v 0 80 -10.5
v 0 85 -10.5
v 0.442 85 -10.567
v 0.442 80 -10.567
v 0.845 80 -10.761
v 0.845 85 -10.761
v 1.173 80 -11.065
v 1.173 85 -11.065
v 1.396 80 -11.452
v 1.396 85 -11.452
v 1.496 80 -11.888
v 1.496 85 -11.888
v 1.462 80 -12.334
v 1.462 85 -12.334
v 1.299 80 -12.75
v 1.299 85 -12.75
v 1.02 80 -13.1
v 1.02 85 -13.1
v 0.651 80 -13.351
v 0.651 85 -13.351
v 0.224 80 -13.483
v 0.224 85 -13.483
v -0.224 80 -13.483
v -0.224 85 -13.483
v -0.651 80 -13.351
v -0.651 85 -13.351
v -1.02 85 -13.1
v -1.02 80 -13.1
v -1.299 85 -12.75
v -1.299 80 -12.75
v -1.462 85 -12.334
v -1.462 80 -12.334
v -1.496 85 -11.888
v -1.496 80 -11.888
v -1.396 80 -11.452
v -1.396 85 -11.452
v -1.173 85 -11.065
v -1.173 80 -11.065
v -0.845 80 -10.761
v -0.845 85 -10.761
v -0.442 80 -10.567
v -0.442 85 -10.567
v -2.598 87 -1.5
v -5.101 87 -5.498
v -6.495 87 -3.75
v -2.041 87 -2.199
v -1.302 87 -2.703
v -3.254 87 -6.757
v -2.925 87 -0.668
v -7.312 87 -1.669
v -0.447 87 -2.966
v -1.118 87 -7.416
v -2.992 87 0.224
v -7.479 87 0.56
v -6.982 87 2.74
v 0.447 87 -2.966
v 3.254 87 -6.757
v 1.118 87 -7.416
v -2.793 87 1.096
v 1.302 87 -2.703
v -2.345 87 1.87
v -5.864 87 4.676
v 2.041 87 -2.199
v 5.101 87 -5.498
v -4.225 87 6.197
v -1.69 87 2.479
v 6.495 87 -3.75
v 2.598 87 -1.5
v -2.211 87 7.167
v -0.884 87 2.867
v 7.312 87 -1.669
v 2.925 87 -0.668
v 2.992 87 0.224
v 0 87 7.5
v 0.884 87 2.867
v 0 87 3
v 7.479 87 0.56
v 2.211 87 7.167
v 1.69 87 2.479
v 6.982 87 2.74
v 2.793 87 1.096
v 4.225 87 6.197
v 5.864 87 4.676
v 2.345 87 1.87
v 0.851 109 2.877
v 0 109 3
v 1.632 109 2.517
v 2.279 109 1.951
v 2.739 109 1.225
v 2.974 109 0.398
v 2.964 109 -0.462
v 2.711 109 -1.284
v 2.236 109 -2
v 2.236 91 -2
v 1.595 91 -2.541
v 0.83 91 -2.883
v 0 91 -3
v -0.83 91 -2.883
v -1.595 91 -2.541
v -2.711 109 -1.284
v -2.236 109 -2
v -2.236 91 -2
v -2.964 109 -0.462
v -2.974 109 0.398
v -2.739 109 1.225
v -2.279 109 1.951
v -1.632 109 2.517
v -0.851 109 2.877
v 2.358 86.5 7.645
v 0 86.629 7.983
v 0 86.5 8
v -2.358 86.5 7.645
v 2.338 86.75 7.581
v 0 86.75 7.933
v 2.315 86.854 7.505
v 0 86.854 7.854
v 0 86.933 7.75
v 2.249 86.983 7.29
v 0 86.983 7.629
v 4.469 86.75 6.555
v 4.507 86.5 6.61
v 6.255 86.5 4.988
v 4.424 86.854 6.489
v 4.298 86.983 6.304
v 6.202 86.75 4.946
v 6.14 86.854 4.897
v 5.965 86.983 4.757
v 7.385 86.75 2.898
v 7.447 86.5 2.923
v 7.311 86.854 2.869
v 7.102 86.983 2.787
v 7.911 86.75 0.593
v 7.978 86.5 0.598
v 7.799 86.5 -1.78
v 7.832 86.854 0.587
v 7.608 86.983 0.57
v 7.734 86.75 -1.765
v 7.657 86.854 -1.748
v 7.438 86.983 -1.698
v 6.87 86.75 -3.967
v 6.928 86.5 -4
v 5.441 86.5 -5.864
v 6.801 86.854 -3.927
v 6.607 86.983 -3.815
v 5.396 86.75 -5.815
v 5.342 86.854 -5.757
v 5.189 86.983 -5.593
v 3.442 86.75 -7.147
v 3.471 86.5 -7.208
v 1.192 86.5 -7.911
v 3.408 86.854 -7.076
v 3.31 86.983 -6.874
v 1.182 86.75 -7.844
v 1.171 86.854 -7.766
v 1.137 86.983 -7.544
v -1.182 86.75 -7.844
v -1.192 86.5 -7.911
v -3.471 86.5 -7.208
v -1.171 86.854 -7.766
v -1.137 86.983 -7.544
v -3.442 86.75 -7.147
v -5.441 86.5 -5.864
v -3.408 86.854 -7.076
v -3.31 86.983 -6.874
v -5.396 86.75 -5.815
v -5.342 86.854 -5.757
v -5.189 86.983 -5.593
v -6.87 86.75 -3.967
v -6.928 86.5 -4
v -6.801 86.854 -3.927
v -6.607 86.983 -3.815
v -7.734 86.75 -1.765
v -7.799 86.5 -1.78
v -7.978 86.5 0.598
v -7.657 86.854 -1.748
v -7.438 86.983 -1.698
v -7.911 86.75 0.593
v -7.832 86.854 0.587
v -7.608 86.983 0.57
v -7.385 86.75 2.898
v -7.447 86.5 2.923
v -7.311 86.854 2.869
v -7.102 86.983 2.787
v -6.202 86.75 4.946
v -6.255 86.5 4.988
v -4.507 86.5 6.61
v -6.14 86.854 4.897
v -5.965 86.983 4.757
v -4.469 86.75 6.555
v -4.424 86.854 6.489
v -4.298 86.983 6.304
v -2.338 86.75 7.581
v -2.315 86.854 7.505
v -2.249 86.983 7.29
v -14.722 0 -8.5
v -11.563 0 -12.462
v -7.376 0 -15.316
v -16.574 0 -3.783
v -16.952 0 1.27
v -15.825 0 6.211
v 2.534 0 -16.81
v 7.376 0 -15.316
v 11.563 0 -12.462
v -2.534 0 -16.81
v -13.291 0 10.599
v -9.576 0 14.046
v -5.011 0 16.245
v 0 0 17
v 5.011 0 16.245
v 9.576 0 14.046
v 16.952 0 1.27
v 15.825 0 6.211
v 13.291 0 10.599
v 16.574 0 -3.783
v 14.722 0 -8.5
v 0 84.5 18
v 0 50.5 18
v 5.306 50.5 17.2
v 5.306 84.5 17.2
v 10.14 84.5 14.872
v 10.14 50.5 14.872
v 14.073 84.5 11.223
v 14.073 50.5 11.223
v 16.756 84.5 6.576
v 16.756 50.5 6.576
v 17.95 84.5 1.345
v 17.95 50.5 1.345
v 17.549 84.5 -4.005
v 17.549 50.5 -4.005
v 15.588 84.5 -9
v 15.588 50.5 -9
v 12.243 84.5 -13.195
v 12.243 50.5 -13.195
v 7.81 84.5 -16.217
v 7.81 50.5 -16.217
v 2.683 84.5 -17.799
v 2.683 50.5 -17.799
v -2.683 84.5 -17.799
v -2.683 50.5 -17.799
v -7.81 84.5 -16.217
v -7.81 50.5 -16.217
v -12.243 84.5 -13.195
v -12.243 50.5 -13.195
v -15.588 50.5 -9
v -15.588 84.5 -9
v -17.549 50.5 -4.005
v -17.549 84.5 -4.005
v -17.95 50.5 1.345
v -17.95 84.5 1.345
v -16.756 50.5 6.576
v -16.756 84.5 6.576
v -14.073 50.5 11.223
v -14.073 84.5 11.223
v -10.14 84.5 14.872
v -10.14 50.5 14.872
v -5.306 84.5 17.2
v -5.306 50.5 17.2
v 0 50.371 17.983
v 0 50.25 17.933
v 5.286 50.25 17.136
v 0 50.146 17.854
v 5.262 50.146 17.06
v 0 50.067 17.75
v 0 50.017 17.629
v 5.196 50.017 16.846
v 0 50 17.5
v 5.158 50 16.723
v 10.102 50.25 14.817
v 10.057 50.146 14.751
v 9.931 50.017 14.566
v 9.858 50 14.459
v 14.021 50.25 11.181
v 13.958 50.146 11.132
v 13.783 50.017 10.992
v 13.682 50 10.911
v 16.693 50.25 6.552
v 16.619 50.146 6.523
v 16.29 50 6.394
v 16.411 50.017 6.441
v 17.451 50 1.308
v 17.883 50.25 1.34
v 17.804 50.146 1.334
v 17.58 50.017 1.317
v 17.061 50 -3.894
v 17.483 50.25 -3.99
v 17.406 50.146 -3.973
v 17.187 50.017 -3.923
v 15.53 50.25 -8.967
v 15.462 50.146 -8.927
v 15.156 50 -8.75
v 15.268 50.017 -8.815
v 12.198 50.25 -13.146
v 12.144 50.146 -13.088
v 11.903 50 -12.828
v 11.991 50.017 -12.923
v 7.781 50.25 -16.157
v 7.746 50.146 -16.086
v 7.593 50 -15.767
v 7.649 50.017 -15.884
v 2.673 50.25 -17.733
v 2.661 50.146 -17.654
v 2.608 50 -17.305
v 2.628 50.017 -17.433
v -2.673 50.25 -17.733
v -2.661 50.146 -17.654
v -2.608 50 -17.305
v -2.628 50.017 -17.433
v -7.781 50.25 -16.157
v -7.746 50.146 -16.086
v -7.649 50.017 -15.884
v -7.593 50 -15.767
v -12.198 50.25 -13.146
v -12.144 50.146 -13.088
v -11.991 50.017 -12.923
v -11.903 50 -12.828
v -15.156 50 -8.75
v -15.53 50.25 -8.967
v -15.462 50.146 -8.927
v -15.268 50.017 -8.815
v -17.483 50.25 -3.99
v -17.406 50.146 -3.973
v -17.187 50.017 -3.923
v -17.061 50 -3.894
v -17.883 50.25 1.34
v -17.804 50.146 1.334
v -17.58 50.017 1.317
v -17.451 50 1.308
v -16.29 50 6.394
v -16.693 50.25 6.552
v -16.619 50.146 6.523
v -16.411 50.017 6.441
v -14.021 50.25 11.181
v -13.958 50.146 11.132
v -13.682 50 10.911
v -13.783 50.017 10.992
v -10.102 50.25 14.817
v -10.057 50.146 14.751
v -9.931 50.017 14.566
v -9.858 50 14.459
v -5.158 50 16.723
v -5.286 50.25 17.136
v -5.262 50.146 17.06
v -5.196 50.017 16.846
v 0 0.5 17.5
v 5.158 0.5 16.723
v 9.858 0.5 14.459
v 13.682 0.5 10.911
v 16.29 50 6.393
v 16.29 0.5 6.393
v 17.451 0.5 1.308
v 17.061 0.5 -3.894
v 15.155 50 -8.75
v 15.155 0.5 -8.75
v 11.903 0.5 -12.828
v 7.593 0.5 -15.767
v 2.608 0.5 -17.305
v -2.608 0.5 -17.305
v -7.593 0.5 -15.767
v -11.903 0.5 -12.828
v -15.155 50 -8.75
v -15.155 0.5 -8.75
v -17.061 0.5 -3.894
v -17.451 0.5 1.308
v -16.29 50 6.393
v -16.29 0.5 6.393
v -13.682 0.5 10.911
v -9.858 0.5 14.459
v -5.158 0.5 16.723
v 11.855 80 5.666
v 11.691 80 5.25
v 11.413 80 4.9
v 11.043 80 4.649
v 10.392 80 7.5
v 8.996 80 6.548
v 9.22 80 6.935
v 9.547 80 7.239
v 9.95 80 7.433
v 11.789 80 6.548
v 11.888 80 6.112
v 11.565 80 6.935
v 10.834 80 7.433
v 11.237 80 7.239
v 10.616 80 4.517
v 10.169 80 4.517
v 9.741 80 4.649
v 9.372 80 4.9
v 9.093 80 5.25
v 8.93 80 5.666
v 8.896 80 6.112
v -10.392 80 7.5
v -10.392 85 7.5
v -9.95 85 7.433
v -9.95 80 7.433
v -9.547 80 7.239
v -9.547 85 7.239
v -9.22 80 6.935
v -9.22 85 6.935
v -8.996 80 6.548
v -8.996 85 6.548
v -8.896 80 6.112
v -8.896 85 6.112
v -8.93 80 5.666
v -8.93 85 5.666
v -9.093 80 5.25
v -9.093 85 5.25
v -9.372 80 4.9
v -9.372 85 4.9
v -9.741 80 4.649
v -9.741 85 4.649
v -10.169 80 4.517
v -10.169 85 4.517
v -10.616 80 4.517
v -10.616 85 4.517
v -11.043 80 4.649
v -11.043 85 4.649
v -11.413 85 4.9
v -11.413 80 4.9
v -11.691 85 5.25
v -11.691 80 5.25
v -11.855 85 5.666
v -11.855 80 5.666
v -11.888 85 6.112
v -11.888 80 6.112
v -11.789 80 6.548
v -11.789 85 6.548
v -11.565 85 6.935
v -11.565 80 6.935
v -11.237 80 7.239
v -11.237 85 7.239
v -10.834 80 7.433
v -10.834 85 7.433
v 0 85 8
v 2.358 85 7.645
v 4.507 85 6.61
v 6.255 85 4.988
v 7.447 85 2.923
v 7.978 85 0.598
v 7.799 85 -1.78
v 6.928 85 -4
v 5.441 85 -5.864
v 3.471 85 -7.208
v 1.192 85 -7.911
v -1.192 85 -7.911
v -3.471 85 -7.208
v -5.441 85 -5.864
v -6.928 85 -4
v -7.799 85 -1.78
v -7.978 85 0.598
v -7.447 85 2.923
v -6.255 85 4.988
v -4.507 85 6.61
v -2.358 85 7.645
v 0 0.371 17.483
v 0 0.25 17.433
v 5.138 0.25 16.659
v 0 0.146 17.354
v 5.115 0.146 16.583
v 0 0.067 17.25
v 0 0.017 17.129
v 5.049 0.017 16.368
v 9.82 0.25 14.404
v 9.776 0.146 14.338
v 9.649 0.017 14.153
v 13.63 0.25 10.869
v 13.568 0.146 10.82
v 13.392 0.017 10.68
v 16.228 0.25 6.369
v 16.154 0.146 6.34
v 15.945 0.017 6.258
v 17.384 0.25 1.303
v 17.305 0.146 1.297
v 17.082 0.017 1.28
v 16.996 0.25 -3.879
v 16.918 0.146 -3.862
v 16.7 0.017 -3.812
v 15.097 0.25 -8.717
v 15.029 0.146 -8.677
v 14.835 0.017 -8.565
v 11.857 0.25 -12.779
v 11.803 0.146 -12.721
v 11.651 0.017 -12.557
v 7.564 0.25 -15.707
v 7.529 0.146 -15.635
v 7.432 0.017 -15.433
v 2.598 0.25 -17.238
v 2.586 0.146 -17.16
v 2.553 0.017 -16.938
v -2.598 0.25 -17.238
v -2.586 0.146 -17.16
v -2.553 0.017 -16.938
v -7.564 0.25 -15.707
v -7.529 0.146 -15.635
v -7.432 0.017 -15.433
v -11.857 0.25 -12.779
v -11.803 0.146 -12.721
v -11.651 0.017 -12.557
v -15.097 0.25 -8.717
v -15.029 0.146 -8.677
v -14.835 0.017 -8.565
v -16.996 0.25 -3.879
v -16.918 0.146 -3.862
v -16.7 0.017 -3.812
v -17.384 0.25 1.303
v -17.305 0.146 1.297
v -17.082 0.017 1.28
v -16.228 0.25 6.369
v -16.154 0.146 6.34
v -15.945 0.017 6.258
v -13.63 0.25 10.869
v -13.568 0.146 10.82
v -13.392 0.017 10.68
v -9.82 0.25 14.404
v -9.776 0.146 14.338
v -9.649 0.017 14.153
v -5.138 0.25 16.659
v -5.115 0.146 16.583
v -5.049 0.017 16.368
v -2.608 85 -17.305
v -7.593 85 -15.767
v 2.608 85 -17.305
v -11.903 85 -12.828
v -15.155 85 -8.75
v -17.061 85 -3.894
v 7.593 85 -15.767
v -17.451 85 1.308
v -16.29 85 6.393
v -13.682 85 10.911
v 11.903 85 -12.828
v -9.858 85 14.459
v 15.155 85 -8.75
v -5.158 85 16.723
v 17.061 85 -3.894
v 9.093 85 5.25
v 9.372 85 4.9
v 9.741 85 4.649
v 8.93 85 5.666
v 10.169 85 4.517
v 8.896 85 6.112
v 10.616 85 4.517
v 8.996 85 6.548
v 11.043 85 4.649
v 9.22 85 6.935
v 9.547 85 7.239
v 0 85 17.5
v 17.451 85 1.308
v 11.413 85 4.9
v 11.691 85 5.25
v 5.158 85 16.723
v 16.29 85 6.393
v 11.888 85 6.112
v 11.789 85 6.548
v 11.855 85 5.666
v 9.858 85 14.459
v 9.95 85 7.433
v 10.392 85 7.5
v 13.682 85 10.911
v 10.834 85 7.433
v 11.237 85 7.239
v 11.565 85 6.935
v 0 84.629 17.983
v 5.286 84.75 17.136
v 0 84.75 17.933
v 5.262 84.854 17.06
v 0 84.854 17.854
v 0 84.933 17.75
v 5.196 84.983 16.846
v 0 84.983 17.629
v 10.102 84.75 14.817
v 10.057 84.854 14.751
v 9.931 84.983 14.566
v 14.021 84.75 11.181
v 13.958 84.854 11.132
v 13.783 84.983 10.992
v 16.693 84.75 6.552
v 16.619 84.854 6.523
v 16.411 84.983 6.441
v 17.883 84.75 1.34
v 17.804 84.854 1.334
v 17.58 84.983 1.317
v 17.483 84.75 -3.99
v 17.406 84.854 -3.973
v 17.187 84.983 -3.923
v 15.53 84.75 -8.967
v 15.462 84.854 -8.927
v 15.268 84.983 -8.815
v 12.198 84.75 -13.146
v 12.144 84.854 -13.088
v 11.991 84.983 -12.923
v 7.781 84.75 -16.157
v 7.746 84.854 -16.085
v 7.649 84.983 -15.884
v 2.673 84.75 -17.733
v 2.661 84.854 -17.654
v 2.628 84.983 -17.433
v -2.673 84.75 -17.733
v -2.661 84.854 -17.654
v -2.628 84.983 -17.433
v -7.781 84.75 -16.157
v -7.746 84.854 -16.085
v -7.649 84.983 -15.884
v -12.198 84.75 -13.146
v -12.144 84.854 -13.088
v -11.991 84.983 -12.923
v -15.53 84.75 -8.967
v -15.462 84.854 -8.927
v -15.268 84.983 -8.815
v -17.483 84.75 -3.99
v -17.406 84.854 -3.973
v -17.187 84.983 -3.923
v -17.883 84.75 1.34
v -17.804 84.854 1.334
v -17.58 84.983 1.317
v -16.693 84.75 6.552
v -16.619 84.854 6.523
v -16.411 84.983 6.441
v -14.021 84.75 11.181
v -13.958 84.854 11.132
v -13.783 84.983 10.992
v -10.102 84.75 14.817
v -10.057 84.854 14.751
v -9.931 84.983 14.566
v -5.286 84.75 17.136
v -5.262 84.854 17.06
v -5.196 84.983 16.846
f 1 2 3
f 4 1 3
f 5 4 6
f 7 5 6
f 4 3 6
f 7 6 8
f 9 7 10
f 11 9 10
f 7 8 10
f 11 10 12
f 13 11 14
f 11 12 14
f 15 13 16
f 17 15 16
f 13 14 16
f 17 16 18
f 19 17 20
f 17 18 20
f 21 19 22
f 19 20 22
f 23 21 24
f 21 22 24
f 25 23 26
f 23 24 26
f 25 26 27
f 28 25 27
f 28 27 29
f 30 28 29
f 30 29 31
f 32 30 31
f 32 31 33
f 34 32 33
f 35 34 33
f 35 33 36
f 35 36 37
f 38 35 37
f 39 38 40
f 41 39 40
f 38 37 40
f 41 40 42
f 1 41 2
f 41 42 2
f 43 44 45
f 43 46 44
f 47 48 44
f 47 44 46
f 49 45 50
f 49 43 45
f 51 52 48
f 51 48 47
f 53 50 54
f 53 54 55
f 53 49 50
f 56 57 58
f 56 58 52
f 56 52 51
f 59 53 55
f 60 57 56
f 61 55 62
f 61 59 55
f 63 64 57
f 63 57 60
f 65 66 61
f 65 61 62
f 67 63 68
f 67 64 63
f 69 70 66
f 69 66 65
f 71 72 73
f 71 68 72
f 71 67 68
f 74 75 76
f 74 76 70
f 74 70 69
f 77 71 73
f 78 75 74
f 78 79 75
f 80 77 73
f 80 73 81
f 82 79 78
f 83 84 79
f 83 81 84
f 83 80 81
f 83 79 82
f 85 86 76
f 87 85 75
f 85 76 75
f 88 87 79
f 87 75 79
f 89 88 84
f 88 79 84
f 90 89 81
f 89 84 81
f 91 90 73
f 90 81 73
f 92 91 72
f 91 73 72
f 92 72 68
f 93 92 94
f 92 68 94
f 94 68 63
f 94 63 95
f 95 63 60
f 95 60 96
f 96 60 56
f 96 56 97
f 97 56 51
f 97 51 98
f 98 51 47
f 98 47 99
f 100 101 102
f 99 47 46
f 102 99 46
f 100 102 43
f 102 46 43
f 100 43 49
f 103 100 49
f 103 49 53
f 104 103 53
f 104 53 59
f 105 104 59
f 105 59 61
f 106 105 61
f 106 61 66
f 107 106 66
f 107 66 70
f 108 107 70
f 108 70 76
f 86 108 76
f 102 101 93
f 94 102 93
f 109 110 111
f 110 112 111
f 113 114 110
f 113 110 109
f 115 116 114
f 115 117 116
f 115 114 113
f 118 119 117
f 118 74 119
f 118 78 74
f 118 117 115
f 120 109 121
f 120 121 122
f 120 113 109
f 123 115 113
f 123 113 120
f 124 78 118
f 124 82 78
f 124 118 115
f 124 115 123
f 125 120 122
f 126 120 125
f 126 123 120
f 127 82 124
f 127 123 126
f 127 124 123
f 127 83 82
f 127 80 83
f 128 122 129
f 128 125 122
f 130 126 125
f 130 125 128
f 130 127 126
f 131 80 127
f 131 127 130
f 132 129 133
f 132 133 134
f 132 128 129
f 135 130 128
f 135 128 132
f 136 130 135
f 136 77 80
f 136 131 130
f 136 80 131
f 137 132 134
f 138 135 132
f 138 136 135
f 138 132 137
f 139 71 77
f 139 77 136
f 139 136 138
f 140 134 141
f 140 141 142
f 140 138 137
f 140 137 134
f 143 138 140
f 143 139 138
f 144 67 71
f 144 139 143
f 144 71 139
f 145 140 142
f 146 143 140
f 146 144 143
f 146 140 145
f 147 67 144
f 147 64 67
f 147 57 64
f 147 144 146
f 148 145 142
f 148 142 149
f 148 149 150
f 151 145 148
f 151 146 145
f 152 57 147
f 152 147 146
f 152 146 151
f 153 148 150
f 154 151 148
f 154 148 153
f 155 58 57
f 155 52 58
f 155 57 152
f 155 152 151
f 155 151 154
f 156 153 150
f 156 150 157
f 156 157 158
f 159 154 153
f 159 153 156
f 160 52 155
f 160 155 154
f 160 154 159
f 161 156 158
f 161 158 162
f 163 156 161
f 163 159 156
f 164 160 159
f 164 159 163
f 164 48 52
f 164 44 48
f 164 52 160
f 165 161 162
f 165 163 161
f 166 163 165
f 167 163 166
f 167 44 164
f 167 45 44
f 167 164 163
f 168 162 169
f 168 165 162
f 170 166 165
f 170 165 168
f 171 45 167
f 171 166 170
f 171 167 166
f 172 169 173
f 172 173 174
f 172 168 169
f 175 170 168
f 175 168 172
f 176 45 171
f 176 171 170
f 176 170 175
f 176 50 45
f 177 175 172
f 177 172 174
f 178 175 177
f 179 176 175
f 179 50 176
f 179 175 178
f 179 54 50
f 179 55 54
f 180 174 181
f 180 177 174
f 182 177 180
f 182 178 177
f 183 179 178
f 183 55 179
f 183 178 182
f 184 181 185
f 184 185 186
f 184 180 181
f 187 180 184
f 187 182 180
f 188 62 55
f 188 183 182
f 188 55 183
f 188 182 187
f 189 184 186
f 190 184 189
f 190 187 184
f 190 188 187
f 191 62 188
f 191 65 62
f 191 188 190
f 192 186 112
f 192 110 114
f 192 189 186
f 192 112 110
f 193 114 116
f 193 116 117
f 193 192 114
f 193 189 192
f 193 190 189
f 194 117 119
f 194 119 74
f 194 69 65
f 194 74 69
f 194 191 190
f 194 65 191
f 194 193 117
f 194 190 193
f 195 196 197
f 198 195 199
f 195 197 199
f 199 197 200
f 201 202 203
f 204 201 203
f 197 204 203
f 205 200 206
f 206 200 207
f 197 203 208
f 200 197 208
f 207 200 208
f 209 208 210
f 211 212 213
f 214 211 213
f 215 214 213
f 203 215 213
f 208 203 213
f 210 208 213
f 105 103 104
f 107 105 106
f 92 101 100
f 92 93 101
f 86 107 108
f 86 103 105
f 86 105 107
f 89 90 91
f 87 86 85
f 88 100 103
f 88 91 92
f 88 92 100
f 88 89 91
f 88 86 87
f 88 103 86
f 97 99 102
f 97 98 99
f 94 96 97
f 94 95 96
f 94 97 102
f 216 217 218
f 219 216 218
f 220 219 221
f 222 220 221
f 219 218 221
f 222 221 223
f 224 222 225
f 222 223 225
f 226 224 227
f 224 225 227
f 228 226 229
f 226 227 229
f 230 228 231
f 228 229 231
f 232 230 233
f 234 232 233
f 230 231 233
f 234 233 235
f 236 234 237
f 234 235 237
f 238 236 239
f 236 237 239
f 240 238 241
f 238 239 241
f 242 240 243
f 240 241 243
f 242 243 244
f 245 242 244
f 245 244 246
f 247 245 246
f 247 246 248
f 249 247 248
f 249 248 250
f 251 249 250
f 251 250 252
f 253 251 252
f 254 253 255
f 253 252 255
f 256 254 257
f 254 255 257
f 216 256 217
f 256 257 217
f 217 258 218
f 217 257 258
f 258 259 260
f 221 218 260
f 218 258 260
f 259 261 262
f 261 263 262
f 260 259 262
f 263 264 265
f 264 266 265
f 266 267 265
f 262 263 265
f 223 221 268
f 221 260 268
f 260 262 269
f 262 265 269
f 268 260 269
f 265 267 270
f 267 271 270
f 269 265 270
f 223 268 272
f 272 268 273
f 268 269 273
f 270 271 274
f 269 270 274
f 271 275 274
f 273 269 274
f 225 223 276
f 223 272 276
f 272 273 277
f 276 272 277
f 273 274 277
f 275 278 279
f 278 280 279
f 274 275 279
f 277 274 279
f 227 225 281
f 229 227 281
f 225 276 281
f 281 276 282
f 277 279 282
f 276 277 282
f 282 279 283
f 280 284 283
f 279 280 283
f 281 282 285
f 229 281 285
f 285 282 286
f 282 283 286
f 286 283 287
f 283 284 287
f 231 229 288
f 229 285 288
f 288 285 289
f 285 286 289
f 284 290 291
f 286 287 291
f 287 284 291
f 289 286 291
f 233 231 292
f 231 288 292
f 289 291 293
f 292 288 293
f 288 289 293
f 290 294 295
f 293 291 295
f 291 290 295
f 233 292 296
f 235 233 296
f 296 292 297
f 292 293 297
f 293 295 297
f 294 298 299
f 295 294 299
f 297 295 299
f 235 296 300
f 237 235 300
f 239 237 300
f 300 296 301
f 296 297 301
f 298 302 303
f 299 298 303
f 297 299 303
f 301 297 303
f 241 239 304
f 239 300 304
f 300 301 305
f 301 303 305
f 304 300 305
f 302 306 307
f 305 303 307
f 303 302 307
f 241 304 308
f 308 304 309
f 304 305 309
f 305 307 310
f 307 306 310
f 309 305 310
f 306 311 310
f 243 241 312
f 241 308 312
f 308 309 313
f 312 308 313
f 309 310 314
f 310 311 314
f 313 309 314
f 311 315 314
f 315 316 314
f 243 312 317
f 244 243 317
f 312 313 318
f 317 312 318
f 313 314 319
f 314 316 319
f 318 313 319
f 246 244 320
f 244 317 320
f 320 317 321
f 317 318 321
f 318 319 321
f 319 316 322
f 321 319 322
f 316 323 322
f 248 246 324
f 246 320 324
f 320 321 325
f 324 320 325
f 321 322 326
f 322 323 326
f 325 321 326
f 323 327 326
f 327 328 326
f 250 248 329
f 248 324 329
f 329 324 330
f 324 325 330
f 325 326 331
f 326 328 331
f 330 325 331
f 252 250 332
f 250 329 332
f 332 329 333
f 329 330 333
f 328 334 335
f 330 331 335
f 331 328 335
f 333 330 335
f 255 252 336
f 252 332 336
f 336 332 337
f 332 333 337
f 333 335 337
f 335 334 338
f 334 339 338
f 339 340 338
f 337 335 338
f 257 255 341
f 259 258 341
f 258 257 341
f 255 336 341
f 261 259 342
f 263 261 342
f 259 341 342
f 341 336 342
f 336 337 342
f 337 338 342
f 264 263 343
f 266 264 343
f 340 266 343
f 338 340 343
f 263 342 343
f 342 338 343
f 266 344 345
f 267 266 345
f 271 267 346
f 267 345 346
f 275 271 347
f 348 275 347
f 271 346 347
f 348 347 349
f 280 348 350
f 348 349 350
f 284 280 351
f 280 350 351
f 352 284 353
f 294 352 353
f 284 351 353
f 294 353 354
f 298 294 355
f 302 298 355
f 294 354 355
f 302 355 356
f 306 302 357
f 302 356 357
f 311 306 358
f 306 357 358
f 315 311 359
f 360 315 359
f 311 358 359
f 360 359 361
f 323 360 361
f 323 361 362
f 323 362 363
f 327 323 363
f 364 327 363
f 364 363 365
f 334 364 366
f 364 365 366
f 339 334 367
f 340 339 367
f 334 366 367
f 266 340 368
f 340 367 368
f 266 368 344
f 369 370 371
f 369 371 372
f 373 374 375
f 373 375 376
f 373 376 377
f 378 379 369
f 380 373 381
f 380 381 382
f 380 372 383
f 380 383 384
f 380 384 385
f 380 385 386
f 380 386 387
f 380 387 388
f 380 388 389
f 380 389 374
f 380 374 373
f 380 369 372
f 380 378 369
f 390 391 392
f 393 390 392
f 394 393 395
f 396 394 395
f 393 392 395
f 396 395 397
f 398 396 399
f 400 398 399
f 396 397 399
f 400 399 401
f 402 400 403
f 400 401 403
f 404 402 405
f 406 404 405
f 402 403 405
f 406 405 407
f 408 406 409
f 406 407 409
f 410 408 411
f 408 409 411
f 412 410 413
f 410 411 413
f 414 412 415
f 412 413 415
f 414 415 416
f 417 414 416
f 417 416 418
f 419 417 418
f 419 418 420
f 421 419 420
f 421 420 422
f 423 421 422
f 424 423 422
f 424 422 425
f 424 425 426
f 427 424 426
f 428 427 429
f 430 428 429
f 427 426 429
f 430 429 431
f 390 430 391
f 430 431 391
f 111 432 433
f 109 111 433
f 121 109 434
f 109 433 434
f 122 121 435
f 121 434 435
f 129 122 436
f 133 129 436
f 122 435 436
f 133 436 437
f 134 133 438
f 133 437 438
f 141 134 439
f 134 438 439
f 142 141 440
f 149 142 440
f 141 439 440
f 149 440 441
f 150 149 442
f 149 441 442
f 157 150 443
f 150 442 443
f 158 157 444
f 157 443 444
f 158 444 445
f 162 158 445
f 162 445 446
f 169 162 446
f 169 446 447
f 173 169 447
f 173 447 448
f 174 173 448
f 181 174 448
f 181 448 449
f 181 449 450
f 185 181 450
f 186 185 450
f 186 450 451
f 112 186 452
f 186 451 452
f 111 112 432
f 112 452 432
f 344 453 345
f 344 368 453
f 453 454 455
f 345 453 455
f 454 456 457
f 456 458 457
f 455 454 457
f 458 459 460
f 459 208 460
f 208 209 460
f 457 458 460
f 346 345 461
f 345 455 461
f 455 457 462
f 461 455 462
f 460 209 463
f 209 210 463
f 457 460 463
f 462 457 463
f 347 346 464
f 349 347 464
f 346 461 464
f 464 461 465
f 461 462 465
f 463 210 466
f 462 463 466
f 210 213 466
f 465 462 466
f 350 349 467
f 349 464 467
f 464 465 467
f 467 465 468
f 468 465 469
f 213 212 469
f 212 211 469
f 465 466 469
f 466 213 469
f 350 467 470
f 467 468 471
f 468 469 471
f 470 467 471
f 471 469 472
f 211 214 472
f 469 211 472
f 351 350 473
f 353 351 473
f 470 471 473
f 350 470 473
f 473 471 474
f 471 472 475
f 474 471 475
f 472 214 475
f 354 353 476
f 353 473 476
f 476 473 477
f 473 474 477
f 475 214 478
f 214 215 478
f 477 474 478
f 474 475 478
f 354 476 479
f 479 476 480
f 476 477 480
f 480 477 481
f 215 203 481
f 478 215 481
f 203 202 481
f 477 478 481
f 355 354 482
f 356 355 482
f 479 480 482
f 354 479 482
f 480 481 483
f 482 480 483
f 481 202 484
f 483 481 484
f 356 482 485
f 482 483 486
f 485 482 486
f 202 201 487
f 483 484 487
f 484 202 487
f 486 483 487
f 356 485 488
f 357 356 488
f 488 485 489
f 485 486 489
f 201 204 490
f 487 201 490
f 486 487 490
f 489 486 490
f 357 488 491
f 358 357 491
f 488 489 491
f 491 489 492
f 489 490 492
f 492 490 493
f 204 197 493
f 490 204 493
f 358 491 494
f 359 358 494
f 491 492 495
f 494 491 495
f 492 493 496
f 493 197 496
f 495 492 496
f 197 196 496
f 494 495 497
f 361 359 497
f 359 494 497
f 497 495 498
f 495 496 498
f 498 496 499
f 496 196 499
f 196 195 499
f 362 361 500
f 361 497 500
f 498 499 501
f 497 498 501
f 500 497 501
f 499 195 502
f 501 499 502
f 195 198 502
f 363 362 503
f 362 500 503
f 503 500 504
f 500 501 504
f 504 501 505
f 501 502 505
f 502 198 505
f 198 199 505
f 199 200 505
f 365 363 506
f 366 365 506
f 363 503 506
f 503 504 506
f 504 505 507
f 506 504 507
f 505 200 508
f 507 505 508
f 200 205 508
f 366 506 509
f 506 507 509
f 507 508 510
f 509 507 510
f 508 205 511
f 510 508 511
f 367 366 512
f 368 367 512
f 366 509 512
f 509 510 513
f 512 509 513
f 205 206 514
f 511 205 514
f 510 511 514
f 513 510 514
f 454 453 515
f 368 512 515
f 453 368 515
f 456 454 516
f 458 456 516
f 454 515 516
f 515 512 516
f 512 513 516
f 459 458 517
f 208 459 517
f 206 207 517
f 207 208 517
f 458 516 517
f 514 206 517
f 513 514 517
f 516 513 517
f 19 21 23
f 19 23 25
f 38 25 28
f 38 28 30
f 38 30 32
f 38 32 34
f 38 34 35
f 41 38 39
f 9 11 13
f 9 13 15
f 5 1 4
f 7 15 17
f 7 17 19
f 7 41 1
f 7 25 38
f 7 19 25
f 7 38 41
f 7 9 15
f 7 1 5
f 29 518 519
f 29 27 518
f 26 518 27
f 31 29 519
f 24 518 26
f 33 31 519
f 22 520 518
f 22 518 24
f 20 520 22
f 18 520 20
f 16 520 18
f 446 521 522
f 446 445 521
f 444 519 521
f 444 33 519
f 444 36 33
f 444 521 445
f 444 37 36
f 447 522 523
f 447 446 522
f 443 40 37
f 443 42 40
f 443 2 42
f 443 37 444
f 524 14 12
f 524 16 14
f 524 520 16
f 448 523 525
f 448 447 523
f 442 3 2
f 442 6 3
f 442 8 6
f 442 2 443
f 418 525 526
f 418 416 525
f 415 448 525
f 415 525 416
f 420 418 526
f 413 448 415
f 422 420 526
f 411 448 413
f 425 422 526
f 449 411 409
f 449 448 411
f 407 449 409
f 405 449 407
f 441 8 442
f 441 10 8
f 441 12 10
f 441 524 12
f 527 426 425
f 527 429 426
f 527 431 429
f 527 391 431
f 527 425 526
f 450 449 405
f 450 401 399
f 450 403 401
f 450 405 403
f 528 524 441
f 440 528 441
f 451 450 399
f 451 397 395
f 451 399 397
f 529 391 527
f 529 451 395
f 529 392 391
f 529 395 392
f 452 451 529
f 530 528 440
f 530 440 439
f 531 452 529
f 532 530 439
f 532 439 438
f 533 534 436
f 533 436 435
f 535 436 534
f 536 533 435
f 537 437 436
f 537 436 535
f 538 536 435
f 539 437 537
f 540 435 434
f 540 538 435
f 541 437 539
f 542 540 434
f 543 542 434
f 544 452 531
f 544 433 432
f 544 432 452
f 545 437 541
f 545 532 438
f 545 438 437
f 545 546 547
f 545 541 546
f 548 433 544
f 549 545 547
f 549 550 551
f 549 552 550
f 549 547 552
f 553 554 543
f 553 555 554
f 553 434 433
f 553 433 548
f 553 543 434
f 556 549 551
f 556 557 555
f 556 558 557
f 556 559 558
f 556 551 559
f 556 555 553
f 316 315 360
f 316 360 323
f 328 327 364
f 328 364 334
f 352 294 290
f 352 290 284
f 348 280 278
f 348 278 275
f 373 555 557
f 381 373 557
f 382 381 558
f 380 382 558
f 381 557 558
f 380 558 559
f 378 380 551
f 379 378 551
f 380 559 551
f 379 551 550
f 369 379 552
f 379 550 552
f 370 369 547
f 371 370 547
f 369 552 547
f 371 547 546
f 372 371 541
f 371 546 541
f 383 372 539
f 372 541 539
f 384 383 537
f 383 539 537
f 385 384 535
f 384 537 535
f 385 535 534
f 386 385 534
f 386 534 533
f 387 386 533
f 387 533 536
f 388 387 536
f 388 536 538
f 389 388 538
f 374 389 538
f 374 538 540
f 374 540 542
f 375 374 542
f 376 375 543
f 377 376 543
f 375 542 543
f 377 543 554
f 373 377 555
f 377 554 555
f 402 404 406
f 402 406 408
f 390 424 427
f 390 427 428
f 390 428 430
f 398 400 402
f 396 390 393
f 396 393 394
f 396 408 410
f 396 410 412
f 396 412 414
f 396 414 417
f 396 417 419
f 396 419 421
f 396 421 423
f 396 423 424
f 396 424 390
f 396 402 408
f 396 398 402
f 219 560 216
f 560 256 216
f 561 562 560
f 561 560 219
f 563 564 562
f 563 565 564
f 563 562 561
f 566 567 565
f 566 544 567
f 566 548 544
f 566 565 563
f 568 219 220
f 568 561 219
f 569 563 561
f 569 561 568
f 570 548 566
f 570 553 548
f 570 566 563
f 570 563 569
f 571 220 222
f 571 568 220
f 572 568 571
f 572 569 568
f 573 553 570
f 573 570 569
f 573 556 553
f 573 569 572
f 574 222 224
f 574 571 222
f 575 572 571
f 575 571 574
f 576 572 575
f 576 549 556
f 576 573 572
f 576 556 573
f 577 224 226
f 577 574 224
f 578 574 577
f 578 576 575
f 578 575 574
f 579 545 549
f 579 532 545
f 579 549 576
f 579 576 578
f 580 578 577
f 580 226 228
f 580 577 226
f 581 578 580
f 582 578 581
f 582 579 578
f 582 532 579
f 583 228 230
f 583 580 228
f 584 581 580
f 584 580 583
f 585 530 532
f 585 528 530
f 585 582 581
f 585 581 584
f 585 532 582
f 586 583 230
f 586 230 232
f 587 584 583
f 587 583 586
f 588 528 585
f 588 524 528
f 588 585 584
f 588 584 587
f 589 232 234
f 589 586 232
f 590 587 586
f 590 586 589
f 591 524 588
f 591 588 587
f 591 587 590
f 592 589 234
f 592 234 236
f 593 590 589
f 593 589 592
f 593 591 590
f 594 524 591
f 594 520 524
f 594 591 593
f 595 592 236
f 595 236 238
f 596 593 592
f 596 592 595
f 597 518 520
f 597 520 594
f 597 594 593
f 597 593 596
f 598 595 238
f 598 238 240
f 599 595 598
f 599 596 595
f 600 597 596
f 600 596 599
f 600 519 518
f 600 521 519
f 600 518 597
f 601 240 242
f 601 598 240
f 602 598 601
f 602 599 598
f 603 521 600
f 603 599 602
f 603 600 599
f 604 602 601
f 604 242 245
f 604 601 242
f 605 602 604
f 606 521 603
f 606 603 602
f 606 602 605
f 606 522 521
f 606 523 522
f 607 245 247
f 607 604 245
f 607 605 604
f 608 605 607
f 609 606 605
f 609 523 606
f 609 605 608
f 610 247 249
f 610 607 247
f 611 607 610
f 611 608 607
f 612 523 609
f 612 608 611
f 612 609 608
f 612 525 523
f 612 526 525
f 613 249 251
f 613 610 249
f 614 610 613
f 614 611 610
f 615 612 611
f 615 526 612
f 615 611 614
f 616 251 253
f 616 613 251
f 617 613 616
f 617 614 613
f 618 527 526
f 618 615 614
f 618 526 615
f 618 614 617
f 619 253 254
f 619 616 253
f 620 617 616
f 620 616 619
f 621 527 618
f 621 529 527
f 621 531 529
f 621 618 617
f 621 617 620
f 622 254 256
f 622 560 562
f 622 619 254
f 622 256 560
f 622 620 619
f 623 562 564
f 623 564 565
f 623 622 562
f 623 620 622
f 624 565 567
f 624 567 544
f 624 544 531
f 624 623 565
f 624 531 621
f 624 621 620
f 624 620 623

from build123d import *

# Parameters (mm, degrees)
SKETCH_1_R          = 17.5
EXTRUDE_1_DEPTH     = 50
SKETCH_3_R          = 18
EXTRUDE_4_DEPTH     = 35
SKETCH_4_R          = 8
EXTRUDE_5_DEPTH     = 2
SKETCH_5_R          = 3
EXTRUDE_6_DEPTH     = 22
SKETCH_6_R          = 1.5
CUT_EXTRUDE_1_DEPTH = 5
SKETCH_7_W          = 8.061647896
SKETCH_7_H          = 1.71902786
CUT_EXTRUDE_2_DEPTH = 18
FILLET_10_R         = 0.5
FILLET_11_R         = 0.5
FILLET_12_R         = 0.5
FILLET_13_R         = 0.5


with BuildPart() as part:
    # 草图1 → 凸台-拉伸1 (new body)
    with BuildSketch(Plane(origin=(0, 0, 0), x_dir=(1, 0, 0), z_dir=(0, 1, 0))):
        with Locations(Location((0, 0, 0), (0, 0, 270))):
            Circle(SKETCH_1_R)
    extrude(amount=EXTRUDE_1_DEPTH)

    # 草图3 → 凸台-拉伸4 (add)
    with BuildSketch(Plane(origin=(0, 50, 0), x_dir=(1, 0, 0), z_dir=(0, 1, 0))):
        with Locations(Location((0, 0, 0), (0, 0, 270))):
            Circle(SKETCH_3_R)
    extrude(amount=EXTRUDE_4_DEPTH)

    # 草图4 → 凸台-拉伸5 (add)
    with BuildSketch(Plane(origin=(0, 85, 0), x_dir=(1, 0, 0), z_dir=(0, 1, 0))):
        with Locations(Location((0, 0, 0), (0, 0, 270))):
            Circle(SKETCH_4_R)
    extrude(amount=EXTRUDE_5_DEPTH)

    # 草图5 → 凸台-拉伸6 (add)
    with BuildSketch(Plane(origin=(0, 87, 0), x_dir=(1, 0, 0), z_dir=(0, 1, 0))):
        with Locations(Location((0, 0, 0), (0, 0, 270))):
            Circle(SKETCH_5_R)
    extrude(amount=EXTRUDE_6_DEPTH)

    # 草图6 → 切除-拉伸1 (cut)
    with BuildSketch(Plane(origin=(0, 85, 0), x_dir=(1, 0, 0), z_dir=(0, 1, 0))):
        with Locations(Location((0, 12, 0), (0, 0, 270))):
            Circle(SKETCH_6_R)
        with Locations(Location((10.392304845, -6, 0), (0, 0, 270))):
            Circle(SKETCH_6_R)
        with Locations(Location((-10.392304845, -6, 0), (0, 0, 270))):
            Circle(SKETCH_6_R)
    extrude(amount=-CUT_EXTRUDE_1_DEPTH, mode=Mode.SUBTRACT)

    # 草图7 → 切除-拉伸2 (cut)
    with BuildSketch(Plane(origin=(0, 109, 0), x_dir=(1, 0, 0), z_dir=(0, 1, 0))):
        with Locations((-0.414937759, 2.85951393)):
            Rectangle(SKETCH_7_W, SKETCH_7_H)
    extrude(amount=-CUT_EXTRUDE_2_DEPTH, mode=Mode.SUBTRACT)

    # 圆角10
    fillet_10_edges = [part.edges().sort_by_distance(p)[0] for p in [
        (0, 85, -18),
    ]]
    fillet(fillet_10_edges, radius=FILLET_10_R)

    # 圆角11
    fillet_11_edges = [part.edges().sort_by_distance(p)[0] for p in [
        (0, 50, -18),
    ]]
    fillet(fillet_11_edges, radius=FILLET_11_R - 0.0001)  # a hair under: the kernel refuses the full size

    # 圆角12
    fillet_12_edges = [part.edges().sort_by_distance(p)[0] for p in [
        (0, 0, -17.5),
    ]]
    fillet(fillet_12_edges, radius=FILLET_12_R)

    # 圆角13
    fillet_13_edges = [part.edges().sort_by_distance(p)[0] for p in [
        (0, 87, -8),
    ]]
    fillet(fillet_13_edges, radius=FILLET_13_R)


solid = part.part
